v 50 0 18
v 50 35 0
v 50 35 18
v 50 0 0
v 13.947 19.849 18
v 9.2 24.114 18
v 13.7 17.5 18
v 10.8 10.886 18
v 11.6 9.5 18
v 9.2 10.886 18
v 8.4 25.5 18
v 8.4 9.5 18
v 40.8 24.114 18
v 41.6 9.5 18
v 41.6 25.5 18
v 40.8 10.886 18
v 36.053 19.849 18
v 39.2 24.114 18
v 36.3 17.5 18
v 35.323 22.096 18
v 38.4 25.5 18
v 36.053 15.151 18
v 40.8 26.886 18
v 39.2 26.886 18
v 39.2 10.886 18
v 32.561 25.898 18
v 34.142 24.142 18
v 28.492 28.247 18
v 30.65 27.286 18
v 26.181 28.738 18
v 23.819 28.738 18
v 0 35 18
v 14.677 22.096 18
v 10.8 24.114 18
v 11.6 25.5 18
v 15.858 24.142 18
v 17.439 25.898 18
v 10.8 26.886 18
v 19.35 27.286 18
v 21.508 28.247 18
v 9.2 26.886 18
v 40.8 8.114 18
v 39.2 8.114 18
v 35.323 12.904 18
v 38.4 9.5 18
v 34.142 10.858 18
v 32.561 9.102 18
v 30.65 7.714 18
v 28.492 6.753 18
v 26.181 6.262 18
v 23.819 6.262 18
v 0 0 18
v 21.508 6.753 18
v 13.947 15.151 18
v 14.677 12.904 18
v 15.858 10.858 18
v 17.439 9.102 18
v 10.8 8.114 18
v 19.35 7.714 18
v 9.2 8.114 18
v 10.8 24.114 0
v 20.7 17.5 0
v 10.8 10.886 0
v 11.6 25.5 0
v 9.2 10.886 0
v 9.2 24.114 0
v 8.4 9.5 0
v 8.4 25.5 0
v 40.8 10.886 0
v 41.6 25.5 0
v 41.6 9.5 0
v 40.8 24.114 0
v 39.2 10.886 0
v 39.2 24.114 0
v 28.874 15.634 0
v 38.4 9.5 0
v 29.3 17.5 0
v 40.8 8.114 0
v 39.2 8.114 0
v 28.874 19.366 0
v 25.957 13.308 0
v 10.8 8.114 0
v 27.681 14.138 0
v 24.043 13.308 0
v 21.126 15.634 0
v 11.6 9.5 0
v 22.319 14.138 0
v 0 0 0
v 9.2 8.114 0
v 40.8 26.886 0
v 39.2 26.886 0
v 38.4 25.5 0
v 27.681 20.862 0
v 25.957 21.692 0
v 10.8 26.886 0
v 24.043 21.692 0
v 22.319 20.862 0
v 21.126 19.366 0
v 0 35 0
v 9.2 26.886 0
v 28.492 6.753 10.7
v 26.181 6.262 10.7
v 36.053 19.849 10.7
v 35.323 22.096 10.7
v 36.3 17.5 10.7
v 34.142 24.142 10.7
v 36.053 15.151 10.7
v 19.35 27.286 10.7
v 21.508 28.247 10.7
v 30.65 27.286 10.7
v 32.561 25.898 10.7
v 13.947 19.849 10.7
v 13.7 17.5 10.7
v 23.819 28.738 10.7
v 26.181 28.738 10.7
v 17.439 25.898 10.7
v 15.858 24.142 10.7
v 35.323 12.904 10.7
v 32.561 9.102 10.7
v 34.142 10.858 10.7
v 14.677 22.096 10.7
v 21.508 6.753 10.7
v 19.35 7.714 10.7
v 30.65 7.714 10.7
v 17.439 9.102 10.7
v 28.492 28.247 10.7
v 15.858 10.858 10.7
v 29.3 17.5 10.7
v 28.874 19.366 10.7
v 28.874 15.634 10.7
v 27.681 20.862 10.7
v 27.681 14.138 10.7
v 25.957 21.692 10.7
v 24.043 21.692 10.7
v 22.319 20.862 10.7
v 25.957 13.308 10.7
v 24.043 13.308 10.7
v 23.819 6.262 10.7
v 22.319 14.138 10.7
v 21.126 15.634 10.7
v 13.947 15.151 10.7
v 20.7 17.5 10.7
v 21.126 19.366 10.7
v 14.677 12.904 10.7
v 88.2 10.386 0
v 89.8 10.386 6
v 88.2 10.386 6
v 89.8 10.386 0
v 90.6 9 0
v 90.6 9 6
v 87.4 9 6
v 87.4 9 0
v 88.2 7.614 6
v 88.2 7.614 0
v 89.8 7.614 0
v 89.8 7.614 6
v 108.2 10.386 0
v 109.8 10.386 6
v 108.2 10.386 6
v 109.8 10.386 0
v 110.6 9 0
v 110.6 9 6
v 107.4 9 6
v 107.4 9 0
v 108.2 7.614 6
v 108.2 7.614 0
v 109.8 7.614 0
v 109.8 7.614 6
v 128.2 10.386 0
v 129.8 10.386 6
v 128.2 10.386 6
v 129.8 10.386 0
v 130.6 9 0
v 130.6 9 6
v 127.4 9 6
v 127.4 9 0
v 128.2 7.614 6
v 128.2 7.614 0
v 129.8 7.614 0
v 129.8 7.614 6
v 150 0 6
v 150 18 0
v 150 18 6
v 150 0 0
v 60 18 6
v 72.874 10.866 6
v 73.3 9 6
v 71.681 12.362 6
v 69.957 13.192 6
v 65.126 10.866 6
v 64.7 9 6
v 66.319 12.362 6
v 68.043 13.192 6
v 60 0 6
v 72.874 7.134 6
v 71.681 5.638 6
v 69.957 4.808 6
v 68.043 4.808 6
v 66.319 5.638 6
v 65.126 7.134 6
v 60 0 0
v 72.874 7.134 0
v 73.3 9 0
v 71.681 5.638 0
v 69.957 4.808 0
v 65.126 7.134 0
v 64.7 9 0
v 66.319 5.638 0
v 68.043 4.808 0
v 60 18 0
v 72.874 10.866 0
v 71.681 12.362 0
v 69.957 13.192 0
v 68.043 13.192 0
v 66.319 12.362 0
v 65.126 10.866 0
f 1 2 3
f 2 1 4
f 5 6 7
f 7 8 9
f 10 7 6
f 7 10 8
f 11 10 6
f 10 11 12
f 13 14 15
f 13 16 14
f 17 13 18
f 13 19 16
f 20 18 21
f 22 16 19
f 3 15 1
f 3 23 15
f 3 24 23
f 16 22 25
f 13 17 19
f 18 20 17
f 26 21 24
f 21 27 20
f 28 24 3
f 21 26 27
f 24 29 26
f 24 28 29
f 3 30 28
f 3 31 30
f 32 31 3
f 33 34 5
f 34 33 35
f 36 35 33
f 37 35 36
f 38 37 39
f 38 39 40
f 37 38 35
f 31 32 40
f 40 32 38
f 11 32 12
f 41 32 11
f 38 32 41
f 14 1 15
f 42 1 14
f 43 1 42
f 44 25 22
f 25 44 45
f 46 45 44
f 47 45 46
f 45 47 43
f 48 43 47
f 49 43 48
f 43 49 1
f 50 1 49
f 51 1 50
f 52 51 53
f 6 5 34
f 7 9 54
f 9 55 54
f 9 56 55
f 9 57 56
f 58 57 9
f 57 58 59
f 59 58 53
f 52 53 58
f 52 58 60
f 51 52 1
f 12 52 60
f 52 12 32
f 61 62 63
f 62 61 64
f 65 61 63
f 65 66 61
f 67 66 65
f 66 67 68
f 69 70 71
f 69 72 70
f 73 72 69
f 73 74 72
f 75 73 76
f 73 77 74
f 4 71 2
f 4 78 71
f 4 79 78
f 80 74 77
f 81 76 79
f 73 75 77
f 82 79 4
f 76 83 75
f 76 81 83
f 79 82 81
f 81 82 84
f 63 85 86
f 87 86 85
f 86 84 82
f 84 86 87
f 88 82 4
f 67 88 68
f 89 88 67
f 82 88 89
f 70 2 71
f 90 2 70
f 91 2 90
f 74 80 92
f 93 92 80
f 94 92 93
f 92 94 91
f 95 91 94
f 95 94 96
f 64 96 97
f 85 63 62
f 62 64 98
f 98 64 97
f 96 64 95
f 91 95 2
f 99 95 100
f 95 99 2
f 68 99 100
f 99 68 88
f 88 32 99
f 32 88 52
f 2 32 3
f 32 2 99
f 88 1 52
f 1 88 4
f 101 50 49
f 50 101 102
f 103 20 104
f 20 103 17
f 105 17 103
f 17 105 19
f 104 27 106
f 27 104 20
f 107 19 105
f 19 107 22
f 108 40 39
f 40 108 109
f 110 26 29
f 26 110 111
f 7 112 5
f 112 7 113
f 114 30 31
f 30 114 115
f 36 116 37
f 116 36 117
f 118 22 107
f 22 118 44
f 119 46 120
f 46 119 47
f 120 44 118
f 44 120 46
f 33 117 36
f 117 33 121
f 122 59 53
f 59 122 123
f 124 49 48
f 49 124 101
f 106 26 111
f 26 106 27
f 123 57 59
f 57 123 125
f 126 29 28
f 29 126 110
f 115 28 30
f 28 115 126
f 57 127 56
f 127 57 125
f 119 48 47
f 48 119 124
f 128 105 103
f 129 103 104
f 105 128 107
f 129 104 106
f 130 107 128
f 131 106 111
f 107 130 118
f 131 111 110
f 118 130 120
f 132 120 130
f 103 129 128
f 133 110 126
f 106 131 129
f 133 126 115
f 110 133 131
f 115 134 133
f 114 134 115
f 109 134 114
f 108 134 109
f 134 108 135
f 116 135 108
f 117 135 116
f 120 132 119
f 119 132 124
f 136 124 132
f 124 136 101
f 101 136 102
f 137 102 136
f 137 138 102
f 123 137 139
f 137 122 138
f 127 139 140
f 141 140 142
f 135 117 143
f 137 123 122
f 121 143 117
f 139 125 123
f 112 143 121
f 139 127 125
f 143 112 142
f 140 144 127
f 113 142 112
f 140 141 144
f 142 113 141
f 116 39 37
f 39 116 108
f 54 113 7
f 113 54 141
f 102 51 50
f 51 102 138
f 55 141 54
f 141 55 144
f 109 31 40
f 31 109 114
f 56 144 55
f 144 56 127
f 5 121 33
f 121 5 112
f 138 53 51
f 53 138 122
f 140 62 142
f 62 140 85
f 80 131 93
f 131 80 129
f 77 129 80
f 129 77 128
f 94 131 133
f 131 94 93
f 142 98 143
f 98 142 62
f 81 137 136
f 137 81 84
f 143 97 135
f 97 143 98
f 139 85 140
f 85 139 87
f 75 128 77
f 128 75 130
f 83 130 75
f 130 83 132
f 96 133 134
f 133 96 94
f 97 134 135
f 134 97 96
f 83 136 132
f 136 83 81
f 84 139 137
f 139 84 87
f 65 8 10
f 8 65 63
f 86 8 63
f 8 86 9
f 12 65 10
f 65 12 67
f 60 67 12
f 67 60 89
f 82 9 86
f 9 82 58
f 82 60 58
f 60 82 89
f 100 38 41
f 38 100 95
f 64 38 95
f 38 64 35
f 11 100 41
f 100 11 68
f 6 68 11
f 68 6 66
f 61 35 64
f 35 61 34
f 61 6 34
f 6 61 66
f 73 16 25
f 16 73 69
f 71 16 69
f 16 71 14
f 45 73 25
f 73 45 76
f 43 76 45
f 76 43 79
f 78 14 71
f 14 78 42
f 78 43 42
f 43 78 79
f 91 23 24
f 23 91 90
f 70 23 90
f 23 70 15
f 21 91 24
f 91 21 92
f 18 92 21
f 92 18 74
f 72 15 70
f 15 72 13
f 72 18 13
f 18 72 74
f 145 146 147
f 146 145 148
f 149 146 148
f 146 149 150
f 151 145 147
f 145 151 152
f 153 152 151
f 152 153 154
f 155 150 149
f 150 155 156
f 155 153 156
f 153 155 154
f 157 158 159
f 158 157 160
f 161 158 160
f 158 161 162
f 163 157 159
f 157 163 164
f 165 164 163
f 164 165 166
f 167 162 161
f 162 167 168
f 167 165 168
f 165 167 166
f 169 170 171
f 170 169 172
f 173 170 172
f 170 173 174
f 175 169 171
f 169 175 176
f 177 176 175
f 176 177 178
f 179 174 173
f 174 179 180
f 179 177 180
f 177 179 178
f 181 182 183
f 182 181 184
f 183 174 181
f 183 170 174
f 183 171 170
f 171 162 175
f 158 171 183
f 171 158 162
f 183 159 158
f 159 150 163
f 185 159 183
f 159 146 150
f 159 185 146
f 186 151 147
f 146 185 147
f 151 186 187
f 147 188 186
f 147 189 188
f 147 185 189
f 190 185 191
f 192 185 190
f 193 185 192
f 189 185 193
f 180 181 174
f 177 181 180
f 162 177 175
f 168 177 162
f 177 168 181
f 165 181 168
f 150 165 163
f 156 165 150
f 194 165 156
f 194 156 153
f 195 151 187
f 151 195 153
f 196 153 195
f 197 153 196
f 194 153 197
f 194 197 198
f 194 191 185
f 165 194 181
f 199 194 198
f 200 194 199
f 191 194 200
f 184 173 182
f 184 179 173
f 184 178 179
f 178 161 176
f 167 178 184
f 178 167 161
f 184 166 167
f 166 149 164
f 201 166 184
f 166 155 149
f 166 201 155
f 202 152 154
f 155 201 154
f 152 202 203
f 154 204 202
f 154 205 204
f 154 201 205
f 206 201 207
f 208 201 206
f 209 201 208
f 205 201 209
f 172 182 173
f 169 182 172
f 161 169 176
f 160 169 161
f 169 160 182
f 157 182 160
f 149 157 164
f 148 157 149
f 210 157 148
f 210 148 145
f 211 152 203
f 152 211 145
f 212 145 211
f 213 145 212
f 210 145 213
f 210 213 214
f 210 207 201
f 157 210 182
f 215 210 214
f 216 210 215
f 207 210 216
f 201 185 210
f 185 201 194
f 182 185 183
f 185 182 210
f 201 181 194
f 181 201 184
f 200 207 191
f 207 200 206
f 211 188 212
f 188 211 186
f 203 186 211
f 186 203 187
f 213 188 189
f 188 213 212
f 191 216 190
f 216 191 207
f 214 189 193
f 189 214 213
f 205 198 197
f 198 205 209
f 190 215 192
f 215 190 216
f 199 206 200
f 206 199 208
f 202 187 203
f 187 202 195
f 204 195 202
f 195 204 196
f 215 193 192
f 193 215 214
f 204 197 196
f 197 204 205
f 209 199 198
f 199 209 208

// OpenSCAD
module rj_preview() {
  // Preview: block + arm placed next to each other.
  w = 50.0; d = 35.0; h = 18.0;
  pocket_d = 22.6; pocket_h = 7.3;
  hole_d = 3.2;
  hx = 15.0; hy = 8.0;
  difference() {
    cube([w, d, h], center=false);
    translate([w/2, d/2, h-pocket_h]) cylinder(h=pocket_h+1, d=pocket_d, center=false);
    translate([w/2, d/2, -1]) cylinder(h=h+2, d=8.6, center=false);
    translate([w/2 + -1*hx, d/2 + -1*hy, -1]) cylinder(h=h+2, d=hole_d, center=false);
    translate([w/2 + -1*hx, d/2 + 1*hy, -1]) cylinder(h=h+2, d=hole_d, center=false);
    translate([w/2 + 1*hx, d/2 + -1*hy, -1]) cylinder(h=h+2, d=hole_d, center=false);
    translate([w/2 + 1*hx, d/2 + 1*hy, -1]) cylinder(h=h+2, d=hole_d, center=false);
  }
  
  translate([60.0, 0, 0]) {
    len = 90.0; w = 18.0; t = 6.0;
    shaft_hole_d = 8.6;
    hole_d = 3.2; pitch = 20.0; n = 3;
    difference() {
      cube([len, w, t], center=false);
      translate([w/2, w/2, -1]) cylinder(h=t+2, d=shaft_hole_d, center=false);
      for (i=[0:n-1]) {
        x = w/2 + (i+1)*pitch;
        if (x < len - w/2) translate([x, w/2, -1]) cylinder(h=t+2, d=hole_d, center=false);
      }
    }
  }
}
rj_preview();
